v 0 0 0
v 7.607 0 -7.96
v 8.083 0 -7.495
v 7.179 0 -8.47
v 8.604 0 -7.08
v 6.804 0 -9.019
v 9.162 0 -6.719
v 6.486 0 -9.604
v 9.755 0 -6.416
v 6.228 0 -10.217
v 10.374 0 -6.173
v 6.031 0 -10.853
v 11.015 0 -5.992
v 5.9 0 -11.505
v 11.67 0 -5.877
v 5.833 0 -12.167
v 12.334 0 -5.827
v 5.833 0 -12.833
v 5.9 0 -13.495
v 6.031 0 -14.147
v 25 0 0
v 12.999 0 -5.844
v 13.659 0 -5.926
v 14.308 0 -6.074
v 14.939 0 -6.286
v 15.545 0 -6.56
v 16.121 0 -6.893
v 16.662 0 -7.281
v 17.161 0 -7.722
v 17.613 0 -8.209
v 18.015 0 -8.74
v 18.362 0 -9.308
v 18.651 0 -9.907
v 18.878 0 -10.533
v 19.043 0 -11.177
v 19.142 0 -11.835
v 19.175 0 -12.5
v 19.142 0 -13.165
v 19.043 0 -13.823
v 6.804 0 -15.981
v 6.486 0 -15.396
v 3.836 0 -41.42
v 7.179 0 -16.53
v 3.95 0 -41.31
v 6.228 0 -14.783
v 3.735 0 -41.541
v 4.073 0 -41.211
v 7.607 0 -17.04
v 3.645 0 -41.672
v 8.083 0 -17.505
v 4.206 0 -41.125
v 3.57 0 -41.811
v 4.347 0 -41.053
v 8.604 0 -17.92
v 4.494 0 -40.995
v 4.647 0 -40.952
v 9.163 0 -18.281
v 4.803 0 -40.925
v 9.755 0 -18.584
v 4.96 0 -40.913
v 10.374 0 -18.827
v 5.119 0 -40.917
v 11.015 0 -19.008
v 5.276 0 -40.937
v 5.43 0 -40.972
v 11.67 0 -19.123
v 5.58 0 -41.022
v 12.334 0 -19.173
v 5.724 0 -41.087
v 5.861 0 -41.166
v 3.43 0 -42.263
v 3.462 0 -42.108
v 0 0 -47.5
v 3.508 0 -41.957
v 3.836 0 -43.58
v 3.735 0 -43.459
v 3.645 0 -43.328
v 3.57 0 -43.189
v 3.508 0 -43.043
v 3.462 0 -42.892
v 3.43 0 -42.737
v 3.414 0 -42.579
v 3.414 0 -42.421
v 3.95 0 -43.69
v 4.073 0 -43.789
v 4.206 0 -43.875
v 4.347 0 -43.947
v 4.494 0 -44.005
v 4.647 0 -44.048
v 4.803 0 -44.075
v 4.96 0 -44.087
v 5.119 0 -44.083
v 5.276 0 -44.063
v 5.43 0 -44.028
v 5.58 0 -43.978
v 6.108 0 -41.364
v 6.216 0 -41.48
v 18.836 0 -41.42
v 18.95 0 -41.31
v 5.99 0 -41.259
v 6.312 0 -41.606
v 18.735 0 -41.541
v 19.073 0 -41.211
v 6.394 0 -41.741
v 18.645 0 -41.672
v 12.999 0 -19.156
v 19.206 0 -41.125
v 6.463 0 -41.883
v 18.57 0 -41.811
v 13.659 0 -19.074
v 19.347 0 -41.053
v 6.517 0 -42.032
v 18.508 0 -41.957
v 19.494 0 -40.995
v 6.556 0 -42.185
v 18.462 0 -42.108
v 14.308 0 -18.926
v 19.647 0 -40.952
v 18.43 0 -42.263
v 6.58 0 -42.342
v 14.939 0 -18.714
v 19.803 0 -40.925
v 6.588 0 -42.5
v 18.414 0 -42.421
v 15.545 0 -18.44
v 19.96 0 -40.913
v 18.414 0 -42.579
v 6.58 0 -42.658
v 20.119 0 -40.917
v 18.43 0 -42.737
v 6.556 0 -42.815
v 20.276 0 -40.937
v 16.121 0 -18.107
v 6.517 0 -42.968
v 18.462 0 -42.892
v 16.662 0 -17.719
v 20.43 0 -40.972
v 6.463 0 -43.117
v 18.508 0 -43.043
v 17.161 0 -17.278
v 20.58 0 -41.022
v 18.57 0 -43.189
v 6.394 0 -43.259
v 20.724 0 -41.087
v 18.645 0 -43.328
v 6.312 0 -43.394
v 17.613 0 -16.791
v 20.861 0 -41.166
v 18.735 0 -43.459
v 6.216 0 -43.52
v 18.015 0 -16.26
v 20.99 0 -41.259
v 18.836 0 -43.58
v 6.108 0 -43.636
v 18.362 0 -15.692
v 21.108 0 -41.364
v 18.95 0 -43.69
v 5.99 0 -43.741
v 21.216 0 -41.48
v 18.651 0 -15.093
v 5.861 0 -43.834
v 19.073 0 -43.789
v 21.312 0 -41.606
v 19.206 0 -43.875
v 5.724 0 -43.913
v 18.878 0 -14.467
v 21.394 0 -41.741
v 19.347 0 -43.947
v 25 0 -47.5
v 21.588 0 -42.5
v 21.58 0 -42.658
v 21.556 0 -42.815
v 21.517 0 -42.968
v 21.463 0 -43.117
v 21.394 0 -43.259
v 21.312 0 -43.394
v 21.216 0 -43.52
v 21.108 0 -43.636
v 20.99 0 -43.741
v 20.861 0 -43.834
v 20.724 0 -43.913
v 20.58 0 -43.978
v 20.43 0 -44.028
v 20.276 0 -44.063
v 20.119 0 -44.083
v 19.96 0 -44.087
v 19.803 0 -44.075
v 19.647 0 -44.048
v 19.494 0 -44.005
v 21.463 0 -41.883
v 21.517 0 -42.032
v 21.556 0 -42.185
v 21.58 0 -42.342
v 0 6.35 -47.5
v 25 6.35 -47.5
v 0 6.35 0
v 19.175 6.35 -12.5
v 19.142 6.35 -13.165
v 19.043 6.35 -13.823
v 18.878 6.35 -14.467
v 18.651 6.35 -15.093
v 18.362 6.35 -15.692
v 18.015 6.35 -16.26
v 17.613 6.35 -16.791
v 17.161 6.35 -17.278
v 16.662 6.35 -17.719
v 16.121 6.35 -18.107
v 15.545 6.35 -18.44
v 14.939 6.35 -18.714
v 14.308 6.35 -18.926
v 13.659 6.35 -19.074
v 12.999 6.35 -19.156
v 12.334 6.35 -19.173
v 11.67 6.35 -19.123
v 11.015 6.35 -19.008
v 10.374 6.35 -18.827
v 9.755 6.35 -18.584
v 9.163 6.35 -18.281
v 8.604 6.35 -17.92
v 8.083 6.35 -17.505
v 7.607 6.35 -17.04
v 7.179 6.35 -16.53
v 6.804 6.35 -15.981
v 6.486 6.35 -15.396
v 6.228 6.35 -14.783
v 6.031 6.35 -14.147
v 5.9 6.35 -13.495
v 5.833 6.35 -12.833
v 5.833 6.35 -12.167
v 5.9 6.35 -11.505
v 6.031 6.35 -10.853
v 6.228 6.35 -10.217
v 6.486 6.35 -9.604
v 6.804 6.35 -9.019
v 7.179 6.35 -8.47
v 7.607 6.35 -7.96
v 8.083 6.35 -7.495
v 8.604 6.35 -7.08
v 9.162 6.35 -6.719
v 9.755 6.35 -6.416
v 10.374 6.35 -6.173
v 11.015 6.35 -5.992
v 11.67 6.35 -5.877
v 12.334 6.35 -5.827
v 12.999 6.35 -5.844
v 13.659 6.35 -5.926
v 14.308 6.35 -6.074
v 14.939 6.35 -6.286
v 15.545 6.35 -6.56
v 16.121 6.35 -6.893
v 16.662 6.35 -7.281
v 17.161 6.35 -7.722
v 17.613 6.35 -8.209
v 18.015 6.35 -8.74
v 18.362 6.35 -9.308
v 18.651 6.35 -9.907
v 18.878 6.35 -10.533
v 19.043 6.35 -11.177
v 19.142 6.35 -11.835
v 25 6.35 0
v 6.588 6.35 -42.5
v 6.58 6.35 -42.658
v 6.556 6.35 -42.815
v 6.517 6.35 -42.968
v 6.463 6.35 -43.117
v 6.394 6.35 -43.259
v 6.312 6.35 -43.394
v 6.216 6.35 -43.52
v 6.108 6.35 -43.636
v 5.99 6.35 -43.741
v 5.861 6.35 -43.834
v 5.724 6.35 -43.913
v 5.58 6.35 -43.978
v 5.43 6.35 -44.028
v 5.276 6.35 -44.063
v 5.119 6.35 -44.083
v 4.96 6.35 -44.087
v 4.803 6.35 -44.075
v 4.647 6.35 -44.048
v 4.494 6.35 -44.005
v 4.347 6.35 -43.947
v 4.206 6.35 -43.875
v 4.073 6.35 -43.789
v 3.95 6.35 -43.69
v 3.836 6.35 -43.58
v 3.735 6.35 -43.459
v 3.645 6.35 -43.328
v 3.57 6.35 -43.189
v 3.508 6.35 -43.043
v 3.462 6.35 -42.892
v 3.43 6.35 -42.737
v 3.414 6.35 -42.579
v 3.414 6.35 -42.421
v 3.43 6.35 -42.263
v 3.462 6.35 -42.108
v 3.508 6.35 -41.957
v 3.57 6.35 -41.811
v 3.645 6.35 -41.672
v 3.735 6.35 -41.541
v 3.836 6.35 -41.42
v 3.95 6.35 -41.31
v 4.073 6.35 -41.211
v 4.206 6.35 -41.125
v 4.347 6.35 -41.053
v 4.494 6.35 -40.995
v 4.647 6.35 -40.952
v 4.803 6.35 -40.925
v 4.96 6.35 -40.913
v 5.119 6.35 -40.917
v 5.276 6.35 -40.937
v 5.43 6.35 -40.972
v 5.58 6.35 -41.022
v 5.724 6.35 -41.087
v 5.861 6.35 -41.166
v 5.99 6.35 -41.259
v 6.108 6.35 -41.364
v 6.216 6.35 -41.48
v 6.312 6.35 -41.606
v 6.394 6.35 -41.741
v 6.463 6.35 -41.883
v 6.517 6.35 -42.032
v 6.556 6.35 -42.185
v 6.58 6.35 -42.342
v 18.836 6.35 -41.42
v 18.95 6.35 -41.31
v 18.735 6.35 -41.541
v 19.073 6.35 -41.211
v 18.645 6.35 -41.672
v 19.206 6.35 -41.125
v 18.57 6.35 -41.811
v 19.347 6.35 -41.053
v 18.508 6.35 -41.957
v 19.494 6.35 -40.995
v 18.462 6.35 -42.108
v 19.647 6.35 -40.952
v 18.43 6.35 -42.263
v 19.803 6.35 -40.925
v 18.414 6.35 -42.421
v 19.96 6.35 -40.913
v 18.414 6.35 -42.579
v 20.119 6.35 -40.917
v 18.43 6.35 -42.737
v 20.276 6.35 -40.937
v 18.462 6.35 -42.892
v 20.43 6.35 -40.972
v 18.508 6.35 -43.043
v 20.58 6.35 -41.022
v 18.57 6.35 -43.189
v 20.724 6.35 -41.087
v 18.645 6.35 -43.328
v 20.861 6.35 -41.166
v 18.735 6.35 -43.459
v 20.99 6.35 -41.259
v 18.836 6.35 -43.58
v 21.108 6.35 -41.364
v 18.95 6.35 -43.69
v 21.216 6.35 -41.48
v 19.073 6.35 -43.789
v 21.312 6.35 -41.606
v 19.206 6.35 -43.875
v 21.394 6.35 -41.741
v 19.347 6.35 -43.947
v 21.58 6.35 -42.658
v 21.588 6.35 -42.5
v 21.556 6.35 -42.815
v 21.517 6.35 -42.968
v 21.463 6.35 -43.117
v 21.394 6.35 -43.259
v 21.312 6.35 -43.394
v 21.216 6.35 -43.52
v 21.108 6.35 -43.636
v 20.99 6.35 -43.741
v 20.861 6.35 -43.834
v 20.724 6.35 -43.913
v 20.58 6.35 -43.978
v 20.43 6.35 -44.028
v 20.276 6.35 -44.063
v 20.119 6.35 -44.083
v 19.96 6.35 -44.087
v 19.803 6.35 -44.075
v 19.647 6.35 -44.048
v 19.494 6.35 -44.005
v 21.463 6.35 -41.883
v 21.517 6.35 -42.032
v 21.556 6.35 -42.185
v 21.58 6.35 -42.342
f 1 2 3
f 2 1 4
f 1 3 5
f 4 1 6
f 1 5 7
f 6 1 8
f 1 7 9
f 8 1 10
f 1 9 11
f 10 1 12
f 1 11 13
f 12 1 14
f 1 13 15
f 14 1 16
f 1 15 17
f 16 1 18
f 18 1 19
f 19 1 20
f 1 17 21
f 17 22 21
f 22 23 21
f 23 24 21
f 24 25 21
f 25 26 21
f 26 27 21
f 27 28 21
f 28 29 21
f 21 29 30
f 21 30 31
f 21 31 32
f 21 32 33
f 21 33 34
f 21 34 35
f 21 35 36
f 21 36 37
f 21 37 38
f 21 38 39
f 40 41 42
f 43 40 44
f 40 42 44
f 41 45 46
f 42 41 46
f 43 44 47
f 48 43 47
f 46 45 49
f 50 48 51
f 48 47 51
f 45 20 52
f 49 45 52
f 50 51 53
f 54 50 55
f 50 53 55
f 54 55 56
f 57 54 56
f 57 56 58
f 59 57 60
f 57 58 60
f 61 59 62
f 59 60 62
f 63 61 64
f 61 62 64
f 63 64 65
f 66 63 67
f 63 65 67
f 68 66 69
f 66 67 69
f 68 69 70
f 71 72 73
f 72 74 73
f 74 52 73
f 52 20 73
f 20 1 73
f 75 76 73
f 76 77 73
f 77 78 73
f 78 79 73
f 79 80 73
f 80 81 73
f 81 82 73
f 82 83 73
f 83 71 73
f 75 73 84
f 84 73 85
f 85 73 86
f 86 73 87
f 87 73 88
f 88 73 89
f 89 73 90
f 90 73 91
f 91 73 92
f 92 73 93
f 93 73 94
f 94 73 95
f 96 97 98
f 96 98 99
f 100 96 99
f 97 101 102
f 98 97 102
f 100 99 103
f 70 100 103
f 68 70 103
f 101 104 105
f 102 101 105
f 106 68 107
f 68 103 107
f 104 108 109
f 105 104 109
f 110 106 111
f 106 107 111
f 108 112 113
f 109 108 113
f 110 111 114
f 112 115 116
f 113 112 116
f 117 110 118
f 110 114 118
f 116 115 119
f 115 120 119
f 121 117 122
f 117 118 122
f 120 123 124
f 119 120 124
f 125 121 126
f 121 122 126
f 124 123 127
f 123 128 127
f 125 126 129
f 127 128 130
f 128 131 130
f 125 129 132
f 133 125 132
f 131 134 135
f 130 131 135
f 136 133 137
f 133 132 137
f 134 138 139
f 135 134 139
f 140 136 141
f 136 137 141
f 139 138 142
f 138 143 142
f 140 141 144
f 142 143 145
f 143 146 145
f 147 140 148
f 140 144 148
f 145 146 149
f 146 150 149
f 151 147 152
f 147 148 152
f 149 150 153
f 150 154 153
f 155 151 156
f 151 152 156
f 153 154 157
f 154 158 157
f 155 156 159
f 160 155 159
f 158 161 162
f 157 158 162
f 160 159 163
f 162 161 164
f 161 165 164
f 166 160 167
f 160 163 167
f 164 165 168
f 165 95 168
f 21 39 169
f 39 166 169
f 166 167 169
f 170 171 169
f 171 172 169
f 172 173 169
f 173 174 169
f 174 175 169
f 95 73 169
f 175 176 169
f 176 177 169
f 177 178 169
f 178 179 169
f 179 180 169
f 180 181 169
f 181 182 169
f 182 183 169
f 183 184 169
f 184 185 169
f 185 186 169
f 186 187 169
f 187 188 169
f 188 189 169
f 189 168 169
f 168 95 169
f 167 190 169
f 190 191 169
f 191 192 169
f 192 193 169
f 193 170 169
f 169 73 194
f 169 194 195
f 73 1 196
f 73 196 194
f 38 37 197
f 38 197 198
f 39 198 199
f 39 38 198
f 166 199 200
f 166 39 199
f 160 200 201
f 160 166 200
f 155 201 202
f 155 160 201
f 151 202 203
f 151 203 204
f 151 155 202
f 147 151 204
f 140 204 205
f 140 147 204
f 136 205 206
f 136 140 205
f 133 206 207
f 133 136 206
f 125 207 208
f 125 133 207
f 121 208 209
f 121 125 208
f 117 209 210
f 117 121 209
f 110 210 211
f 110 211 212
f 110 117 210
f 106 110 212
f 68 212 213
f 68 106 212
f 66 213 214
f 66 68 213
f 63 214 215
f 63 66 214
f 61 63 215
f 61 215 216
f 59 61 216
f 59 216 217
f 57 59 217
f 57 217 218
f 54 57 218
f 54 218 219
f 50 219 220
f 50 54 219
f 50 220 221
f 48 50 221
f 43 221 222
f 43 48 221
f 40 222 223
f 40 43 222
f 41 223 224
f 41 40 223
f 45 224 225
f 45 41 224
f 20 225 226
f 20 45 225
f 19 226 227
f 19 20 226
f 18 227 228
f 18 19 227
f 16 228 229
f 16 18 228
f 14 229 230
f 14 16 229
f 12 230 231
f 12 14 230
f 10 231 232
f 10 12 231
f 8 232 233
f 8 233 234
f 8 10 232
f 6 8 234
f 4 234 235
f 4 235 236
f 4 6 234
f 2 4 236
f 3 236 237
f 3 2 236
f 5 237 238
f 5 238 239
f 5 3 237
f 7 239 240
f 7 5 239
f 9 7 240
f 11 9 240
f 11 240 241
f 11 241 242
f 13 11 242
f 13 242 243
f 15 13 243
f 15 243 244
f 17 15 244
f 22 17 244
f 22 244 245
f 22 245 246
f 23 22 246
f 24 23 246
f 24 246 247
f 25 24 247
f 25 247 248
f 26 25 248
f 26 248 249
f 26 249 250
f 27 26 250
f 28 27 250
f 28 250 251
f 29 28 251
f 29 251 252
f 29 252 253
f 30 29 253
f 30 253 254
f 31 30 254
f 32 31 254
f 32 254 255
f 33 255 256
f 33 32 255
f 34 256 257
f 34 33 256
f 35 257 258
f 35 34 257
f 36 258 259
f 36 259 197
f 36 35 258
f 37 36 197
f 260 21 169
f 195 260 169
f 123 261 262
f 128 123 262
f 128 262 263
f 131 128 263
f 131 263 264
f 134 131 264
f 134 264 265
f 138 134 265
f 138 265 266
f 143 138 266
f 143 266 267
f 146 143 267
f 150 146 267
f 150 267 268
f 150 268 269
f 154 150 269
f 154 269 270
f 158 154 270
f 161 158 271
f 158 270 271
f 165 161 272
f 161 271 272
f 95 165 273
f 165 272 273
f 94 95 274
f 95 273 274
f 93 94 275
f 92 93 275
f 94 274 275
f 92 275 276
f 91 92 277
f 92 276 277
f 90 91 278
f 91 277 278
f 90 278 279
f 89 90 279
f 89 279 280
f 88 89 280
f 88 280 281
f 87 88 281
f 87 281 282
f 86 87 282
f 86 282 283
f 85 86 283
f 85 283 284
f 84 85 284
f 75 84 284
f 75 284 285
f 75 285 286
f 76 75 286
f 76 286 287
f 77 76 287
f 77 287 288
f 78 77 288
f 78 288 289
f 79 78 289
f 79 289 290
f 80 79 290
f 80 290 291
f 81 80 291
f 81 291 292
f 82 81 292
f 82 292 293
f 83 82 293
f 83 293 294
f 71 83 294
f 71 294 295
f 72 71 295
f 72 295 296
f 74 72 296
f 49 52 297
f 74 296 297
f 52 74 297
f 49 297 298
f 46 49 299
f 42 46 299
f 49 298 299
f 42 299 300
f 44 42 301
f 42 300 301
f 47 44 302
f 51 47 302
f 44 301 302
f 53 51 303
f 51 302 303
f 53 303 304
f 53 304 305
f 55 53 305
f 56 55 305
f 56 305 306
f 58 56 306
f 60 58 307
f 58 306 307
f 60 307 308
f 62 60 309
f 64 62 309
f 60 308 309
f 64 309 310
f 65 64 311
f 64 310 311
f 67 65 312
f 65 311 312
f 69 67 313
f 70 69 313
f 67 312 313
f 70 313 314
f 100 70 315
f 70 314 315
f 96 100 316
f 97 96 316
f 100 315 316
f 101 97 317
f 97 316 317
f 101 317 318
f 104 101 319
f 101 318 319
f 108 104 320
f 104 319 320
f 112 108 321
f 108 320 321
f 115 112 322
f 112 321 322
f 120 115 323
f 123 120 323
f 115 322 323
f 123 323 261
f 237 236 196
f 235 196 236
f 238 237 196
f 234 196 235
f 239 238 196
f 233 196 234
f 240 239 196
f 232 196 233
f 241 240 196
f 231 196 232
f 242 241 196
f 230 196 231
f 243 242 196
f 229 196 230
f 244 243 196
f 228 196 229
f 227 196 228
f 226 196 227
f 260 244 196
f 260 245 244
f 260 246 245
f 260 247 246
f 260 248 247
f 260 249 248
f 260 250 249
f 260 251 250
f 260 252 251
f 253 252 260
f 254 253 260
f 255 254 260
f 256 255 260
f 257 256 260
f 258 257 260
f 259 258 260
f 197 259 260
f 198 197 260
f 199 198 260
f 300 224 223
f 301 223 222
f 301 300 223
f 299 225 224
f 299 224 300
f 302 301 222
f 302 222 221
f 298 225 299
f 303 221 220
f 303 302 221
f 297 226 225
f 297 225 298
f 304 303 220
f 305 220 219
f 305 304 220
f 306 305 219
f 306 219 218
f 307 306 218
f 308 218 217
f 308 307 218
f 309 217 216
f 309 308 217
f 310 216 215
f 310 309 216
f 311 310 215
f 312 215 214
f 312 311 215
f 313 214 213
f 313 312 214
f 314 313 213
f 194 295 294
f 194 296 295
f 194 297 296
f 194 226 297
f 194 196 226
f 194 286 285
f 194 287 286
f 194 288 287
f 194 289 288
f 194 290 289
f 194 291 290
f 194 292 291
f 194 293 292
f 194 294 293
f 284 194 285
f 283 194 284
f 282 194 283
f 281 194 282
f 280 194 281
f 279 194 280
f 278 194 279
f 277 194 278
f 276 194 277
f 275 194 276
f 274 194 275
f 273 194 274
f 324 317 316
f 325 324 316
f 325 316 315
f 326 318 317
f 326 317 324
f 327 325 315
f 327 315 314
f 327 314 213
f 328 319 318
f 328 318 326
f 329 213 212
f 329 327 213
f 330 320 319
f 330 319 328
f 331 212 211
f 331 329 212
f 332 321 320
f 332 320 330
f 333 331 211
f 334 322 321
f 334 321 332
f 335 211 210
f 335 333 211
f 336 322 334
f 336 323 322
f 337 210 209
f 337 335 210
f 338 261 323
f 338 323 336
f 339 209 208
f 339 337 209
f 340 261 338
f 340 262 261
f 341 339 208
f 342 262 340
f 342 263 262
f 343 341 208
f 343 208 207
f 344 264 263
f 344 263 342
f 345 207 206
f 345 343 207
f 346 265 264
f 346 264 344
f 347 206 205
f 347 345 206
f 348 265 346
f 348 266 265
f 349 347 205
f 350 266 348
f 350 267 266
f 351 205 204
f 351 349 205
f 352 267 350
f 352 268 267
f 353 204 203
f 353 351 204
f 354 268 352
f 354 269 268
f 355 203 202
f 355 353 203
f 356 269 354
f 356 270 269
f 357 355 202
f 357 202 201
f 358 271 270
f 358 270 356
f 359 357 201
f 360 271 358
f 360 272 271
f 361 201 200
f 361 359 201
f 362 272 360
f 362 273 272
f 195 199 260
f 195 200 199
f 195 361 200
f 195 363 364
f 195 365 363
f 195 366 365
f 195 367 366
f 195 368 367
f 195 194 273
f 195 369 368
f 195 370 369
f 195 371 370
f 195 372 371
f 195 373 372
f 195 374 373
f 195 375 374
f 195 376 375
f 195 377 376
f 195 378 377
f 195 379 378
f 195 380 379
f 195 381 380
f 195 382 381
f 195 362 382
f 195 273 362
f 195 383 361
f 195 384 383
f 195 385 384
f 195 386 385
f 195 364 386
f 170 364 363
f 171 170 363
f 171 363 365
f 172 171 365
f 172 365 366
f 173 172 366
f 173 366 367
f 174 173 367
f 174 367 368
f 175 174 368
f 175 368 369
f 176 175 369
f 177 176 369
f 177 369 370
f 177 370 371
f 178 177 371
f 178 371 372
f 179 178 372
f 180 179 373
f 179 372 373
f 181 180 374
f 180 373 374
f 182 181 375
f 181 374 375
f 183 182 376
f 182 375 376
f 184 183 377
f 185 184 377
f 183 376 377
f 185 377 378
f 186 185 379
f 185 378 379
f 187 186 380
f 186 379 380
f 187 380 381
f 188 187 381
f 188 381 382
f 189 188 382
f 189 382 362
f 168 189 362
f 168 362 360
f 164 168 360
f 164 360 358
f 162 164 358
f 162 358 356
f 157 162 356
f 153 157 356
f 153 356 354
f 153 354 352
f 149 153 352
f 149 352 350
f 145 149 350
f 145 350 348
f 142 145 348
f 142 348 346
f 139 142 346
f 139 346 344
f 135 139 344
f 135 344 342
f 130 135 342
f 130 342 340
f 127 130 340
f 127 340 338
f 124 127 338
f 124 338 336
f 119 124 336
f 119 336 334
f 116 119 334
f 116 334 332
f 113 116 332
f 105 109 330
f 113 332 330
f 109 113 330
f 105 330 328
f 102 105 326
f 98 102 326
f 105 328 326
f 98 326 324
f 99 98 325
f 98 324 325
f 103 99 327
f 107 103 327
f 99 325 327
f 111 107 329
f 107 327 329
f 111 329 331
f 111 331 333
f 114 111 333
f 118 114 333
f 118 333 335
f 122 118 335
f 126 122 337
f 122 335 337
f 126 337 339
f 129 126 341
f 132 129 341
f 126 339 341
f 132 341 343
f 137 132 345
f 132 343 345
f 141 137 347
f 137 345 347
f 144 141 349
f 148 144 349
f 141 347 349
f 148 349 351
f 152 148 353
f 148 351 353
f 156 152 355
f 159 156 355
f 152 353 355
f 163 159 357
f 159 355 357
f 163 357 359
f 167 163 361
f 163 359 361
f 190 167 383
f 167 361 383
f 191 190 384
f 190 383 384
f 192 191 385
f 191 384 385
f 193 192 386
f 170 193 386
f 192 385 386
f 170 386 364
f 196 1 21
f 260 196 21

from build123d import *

# Parameters (mm, degrees)
SKETCH1_W           = 25
SKETCH1_H           = 47.5
SKETCH1_R           = 6.675
BOSS_EXTRUDE1_DEPTH = 6.35
CUT_EXTRUDE1_REACH  = 8.35
SKETCH2_R           = 1.5875


with BuildPart() as part:
    # Sketch1 → Boss-Extrude1 (new body)
    with BuildSketch(Plane(origin=(0, 0, 0), x_dir=(1, 0, 0), z_dir=(0, 1, 0))):
        with Locations((12.5, 23.75)):
            Rectangle(SKETCH1_W, SKETCH1_H)
        with Locations((12.5, 12.5)):
            Circle(SKETCH1_R, mode=Mode.SUBTRACT)
    extrude(amount=BOSS_EXTRUDE1_DEPTH)

    # Sketch2 → Cut-Extrude1 (cut, up to next)
    with BuildSketch(Plane(origin=(0, 6.35, 0), x_dir=(1, 0, 0), z_dir=(0, 1, 0)), mode=Mode.PRIVATE) as cut_extrude1_sk1:
        with Locations((20, 42.5)):
            Circle(SKETCH2_R)
    cut_extrude1_tool1 = extrude(cut_extrude1_sk1.sketch, amount=-CUT_EXTRUDE1_REACH, mode=Mode.PRIVATE) & part.part
    add(cut_extrude1_tool1.solids().sort_by_distance((20, 6.35, -42.5))[0], mode=Mode.SUBTRACT)
    # Sketch2 → Cut-Extrude1 (cut, up to next)
    with BuildSketch(Plane(origin=(0, 6.35, 0), x_dir=(1, 0, 0), z_dir=(0, 1, 0)), mode=Mode.PRIVATE) as cut_extrude1_sk2:
        with Locations((5, 42.5)):
            Circle(SKETCH2_R)
    cut_extrude1_tool2 = extrude(cut_extrude1_sk2.sketch, amount=-CUT_EXTRUDE1_REACH, mode=Mode.PRIVATE) & part.part
    add(cut_extrude1_tool2.solids().sort_by_distance((5, 6.35, -42.5))[0], mode=Mode.SUBTRACT)


solid = part.part
